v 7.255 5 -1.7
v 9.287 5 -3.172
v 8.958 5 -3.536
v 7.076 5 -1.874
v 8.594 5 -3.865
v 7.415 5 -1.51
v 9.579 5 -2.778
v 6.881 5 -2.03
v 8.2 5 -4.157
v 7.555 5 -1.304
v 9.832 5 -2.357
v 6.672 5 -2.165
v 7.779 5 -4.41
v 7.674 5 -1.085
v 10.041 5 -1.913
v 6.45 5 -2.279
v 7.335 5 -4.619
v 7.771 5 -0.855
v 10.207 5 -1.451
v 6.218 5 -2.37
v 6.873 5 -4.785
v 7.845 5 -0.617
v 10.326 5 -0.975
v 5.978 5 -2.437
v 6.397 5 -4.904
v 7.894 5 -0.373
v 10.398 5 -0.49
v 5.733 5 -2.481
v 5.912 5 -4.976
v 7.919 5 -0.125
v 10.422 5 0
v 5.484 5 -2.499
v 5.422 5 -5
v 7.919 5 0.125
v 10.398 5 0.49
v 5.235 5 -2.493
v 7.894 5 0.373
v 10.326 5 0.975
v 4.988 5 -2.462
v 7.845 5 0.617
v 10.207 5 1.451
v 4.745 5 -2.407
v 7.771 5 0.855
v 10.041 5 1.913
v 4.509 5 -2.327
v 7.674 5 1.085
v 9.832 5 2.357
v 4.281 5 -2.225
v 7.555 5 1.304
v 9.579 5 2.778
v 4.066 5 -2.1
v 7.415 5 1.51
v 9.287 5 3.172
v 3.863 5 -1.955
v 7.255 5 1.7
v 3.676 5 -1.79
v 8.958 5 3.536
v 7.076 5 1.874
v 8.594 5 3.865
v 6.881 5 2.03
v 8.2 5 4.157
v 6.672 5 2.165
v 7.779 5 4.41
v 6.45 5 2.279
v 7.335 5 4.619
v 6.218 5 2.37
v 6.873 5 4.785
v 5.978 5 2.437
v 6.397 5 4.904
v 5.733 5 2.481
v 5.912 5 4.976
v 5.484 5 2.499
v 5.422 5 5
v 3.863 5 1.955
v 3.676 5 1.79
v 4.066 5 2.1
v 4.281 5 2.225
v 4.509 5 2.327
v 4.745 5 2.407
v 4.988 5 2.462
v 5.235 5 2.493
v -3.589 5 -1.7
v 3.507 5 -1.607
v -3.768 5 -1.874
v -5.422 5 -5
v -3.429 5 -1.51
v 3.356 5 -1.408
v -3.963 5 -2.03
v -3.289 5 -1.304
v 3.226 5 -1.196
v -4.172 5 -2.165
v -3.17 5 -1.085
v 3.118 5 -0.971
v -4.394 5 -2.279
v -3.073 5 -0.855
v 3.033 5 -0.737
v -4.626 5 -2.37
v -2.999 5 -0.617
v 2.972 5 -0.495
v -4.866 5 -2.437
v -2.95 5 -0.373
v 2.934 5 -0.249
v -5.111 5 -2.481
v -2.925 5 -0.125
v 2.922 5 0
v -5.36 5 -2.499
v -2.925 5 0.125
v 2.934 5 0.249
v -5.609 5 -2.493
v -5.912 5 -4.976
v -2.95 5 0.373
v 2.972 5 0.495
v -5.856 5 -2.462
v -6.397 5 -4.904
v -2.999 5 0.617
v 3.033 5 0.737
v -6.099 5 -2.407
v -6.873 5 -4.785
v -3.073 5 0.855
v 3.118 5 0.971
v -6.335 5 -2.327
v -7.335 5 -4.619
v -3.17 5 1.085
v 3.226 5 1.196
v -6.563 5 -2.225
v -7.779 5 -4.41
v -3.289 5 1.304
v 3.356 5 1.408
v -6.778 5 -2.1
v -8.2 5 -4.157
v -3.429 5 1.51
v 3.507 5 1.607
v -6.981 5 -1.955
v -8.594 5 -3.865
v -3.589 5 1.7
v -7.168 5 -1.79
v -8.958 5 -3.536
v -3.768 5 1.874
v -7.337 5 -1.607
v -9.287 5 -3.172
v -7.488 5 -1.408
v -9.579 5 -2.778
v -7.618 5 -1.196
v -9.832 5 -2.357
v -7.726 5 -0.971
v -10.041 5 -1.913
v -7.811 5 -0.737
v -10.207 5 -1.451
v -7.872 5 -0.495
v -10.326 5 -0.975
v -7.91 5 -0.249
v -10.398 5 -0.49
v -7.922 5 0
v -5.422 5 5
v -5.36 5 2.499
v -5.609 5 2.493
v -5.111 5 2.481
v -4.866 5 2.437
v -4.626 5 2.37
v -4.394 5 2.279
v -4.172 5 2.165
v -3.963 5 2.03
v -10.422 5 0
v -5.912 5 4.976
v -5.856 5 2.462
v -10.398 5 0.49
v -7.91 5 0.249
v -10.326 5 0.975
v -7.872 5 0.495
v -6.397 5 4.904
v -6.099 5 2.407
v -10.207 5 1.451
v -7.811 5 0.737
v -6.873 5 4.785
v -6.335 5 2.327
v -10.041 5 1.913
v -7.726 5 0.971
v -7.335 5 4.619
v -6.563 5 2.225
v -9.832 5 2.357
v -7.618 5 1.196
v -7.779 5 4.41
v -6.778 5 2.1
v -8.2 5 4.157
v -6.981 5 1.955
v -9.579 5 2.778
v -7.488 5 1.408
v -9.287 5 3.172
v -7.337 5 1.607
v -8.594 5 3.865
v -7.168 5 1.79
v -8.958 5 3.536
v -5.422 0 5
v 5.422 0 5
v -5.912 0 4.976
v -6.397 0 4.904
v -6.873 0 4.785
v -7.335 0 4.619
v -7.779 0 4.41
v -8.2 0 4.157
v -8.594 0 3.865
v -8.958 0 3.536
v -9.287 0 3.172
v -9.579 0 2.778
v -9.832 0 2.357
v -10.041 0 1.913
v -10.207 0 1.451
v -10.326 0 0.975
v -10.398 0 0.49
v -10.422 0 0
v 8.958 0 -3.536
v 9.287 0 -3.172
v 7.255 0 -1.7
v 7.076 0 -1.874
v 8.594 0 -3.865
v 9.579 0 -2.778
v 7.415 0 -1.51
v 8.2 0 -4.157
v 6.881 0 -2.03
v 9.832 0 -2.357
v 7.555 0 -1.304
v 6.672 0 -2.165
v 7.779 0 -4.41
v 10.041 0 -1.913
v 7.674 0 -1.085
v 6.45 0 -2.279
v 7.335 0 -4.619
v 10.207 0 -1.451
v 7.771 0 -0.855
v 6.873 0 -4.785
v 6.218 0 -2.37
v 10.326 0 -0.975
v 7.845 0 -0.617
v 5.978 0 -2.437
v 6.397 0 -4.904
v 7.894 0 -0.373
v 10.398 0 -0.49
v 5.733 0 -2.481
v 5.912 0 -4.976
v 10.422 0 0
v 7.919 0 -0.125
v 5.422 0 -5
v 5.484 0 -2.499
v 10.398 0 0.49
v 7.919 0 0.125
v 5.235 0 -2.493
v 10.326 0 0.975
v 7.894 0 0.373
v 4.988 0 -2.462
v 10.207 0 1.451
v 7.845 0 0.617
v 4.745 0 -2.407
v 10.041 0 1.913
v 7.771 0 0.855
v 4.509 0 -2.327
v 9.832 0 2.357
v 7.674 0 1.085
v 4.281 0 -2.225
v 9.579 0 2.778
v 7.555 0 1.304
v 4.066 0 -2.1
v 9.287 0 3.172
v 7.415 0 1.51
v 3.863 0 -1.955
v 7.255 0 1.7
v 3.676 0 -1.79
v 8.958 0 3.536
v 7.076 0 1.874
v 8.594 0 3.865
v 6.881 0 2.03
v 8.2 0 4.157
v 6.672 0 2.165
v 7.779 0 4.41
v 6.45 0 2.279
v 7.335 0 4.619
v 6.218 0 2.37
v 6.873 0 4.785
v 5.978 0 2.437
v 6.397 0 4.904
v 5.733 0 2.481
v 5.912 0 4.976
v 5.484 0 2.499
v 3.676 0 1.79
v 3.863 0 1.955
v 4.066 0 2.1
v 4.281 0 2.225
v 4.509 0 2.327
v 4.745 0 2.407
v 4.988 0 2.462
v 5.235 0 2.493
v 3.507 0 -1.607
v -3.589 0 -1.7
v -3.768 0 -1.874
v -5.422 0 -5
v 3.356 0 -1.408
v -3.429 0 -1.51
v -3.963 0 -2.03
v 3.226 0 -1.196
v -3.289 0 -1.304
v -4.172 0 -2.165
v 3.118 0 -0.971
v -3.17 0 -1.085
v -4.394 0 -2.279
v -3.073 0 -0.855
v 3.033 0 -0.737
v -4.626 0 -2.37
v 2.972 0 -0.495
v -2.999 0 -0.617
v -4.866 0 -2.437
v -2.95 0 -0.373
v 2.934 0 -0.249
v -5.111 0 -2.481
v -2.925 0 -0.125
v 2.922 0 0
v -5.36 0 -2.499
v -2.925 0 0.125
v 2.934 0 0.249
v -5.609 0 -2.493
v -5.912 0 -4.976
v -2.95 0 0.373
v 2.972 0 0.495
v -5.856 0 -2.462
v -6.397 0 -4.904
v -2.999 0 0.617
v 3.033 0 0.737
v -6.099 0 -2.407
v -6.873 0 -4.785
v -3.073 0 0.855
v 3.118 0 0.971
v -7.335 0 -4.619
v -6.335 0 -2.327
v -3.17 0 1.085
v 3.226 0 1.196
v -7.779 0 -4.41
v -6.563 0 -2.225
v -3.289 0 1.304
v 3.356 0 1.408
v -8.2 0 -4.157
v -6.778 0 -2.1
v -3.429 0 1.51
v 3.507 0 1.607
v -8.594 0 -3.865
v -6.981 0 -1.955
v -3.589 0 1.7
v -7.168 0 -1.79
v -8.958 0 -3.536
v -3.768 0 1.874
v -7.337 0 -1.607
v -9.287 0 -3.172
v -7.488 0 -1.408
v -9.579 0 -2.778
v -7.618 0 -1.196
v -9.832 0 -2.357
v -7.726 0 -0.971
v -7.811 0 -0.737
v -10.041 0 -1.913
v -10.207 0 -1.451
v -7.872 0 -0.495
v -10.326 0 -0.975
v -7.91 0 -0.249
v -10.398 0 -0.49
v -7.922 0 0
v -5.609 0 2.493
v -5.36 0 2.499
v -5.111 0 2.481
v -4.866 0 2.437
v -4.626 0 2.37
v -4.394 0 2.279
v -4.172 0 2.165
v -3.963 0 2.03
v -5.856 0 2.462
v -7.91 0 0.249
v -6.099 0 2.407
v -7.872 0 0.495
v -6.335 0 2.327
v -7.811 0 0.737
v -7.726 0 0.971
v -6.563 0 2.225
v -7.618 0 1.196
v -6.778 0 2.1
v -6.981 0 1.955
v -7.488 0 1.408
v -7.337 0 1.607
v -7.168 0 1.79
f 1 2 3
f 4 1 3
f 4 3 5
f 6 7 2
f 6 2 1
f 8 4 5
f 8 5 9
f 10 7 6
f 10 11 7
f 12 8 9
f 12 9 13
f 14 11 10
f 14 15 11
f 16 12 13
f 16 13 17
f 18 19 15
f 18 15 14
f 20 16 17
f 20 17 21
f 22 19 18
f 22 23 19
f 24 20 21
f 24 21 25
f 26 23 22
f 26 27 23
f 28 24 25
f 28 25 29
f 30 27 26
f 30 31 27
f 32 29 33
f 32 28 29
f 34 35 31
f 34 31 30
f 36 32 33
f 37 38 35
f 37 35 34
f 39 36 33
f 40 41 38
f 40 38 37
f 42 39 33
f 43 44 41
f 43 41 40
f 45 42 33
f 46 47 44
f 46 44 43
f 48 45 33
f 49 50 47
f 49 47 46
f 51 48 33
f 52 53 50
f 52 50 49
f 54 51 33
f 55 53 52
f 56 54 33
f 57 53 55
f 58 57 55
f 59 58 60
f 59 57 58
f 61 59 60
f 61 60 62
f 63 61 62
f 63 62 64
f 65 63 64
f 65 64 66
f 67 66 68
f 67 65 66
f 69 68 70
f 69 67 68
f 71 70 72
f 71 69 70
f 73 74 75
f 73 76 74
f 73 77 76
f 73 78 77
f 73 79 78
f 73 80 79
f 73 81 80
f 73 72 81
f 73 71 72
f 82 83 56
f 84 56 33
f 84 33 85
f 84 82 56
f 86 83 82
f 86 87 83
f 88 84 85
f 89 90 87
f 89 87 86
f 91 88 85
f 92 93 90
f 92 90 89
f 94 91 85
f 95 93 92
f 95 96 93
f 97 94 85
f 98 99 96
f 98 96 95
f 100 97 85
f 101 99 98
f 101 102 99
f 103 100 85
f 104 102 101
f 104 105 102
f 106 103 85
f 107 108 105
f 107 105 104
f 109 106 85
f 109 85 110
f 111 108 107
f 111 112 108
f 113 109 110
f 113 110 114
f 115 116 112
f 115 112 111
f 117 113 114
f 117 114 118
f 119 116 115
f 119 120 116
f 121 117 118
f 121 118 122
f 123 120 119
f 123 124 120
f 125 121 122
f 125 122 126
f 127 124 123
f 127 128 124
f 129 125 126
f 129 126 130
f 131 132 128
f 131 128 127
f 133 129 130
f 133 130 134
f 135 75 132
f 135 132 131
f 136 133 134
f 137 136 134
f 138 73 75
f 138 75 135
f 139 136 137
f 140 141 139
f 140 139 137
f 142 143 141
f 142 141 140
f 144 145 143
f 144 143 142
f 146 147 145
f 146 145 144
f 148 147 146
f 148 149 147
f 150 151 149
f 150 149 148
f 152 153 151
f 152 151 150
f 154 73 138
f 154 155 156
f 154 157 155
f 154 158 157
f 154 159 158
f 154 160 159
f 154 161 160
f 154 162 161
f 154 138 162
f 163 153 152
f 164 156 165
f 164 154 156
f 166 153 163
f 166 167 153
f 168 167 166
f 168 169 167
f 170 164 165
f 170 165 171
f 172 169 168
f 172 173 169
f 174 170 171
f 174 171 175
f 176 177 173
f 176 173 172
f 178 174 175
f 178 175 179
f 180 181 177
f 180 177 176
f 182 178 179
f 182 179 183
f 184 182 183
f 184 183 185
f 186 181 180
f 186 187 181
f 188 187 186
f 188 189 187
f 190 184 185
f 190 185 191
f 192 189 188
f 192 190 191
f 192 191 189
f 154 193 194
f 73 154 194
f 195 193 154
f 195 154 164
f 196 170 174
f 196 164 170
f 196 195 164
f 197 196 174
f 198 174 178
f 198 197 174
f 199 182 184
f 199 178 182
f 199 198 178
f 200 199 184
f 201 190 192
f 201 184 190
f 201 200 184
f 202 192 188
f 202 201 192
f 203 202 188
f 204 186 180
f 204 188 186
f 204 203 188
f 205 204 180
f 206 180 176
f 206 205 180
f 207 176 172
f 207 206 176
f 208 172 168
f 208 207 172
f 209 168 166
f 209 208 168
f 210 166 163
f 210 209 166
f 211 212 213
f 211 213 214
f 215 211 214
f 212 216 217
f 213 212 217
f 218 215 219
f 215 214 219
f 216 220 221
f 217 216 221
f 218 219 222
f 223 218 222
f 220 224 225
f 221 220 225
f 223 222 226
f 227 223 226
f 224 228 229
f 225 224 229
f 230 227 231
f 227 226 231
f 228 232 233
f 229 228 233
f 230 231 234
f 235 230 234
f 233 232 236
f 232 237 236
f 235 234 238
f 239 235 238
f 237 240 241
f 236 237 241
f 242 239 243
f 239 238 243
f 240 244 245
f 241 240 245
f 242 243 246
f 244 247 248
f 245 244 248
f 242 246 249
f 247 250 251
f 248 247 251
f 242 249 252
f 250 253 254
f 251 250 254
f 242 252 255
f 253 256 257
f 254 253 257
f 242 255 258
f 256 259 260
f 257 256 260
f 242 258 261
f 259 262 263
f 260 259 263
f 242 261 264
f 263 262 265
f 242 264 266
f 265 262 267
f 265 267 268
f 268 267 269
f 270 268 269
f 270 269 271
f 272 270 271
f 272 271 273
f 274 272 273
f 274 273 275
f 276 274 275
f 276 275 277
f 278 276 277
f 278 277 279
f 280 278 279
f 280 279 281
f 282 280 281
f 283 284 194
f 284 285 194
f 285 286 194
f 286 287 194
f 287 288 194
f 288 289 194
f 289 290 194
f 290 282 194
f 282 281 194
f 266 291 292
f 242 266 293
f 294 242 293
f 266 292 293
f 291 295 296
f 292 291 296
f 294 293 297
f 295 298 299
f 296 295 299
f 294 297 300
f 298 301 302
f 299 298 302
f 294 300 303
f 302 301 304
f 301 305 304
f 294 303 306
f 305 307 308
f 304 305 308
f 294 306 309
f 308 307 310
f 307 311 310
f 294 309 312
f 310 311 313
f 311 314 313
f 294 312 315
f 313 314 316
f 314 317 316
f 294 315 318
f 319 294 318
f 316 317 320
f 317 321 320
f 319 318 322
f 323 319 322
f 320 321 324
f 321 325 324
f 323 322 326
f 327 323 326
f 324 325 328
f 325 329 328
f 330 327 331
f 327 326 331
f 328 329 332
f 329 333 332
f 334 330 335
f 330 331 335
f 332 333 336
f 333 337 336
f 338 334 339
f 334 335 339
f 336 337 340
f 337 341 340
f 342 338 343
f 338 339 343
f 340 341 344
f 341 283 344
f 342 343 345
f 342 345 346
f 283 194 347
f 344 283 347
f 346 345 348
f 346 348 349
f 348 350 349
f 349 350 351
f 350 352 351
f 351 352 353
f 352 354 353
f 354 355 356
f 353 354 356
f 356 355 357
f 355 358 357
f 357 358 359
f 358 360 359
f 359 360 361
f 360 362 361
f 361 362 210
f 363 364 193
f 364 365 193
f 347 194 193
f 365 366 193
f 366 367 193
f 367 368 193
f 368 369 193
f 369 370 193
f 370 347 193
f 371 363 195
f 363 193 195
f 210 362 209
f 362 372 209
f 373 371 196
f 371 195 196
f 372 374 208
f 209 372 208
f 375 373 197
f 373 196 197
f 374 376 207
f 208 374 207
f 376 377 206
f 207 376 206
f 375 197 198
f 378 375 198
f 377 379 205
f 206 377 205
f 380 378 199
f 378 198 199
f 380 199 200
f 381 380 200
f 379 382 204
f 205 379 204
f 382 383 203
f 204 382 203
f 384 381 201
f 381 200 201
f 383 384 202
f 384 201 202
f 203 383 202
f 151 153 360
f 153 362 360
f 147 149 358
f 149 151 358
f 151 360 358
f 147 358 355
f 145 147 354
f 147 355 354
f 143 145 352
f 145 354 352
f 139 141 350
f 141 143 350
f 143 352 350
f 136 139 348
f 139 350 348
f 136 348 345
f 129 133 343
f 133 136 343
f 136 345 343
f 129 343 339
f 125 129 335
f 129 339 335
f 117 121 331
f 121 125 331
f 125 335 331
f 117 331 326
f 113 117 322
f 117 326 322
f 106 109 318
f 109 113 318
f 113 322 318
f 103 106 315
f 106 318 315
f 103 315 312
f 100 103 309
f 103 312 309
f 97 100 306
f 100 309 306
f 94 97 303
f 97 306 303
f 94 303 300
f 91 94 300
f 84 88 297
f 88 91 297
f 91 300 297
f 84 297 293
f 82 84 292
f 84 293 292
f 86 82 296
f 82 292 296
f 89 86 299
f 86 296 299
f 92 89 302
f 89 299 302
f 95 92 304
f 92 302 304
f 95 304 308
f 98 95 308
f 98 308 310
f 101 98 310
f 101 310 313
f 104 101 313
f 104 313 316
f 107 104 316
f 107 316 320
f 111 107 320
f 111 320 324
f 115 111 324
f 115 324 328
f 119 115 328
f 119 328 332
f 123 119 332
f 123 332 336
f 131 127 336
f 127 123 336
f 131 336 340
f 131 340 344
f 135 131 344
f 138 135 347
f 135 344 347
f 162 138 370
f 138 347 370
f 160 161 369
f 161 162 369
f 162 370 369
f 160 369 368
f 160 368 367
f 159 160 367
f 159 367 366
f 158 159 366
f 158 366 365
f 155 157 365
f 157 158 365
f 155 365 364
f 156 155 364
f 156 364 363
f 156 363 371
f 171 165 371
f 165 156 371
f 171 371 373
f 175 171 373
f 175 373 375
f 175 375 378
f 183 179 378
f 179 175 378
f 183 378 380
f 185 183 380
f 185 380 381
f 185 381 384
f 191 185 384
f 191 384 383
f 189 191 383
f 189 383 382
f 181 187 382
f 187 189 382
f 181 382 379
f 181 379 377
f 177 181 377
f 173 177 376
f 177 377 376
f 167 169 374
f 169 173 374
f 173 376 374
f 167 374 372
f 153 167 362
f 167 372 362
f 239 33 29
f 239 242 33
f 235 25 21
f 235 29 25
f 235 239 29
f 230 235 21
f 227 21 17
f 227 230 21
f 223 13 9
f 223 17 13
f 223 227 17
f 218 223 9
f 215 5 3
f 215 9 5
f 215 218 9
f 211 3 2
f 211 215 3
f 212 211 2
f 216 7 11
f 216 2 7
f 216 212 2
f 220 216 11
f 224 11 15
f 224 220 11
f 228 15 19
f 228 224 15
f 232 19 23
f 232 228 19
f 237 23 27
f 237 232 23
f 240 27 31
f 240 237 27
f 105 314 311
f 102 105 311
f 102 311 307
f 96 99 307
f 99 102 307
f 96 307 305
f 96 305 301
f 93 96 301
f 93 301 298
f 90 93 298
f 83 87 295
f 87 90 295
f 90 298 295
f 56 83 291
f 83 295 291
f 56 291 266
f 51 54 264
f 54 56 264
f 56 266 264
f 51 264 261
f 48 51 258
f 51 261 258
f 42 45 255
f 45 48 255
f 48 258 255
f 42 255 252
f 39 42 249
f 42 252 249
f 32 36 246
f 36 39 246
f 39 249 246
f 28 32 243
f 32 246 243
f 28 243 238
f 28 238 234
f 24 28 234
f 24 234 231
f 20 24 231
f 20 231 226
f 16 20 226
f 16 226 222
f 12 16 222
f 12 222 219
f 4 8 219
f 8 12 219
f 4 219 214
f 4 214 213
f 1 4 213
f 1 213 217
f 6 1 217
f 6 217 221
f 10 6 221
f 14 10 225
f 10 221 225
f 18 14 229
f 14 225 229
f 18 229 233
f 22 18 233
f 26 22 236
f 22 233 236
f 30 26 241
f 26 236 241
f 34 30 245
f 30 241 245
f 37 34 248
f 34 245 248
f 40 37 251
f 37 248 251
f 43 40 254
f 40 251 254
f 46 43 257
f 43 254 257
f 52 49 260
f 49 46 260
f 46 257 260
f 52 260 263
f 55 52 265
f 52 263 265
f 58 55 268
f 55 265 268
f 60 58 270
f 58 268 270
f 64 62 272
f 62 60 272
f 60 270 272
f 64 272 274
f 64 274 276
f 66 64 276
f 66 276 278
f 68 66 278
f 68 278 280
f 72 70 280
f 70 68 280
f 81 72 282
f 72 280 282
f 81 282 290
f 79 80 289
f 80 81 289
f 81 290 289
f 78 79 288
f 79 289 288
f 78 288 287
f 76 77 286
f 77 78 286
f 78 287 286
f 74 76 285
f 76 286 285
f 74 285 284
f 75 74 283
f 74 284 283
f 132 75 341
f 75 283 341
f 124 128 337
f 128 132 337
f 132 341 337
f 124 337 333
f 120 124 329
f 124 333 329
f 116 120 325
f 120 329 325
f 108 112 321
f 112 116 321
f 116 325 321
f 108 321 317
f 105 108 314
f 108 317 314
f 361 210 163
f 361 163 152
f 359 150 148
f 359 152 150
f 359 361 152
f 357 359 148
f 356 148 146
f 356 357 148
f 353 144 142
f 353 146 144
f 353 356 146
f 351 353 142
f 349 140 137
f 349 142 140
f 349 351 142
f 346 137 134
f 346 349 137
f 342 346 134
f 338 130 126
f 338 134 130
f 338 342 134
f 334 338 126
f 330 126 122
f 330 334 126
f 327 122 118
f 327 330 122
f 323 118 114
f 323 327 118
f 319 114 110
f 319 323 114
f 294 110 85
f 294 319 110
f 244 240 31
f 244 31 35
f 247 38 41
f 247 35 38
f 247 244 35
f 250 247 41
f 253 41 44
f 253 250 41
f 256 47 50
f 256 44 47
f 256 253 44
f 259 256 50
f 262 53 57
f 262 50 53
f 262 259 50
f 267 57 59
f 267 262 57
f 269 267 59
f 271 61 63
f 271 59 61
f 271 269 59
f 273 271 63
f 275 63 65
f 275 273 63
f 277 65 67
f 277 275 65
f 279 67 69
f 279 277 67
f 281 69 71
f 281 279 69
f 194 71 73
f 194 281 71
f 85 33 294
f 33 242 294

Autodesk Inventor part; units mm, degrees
ref_plane "YZ Plane" through (0, 0, 0) normal (1, 0, 0) x (0, 1, 0)
ref_plane "XZ Plane" through (0, 0, 0) normal (0, 1, 0) x (-1, 0, 0)
ref_plane "XY Plane" through (0, 0, 0) normal (0, 0, 1) x (1, 0, 0)
sketch "Sketch1" plane through (0, 0, 0) normal (0, 1, 0) x (-1, 0, 0)
  line L0 (-5.422, -5) -> (5.422, -5)
  line L1 (10.422, 0) -> (10.422, 0)
  line L2 (5.422, 5) -> (-5.422, 5)
  line L3 (-10.422, 0) -> (-10.422, 0)
  line L4 (-10.422, -5) -> (10.422, 5) construction
  line L5 (10.422, -5) -> (-10.422, 5) construction
  circle A0 centre (5.422, 0) radius 2.5
  circle A1 centre (-5.422, 0) radius 2.5
  arc A2 (5.422, -5) -> (10.422, 0) centre (5.422, 0) ccw
  arc A3 (10.422, 0) -> (5.422, 5) centre (5.422, 0) ccw
  arc A4 (-5.422, 5) -> (-10.422, 0) centre (-5.422, 0) ccw
  arc A5 (-10.422, 0) -> (-5.422, -5) centre (-5.422, 0) ccw
  point P0 (0, 0)
  point P1 (10.422, 0)
  point P2 (-10.422, 0)
  dimension "d0" = 10
  dimension "d1" = 20.844
  dimension "d3" = 5
  dimension "d4" = 5
  dimension "d5" = 5
  dimension "d6" = 5
  dimension "d7" = 5
  dimension "d8" = 5
  dimension "d9" = 5
extrude "Extrusion1" add sketch "Sketch1" along normal blind 5
properties part number "link"
